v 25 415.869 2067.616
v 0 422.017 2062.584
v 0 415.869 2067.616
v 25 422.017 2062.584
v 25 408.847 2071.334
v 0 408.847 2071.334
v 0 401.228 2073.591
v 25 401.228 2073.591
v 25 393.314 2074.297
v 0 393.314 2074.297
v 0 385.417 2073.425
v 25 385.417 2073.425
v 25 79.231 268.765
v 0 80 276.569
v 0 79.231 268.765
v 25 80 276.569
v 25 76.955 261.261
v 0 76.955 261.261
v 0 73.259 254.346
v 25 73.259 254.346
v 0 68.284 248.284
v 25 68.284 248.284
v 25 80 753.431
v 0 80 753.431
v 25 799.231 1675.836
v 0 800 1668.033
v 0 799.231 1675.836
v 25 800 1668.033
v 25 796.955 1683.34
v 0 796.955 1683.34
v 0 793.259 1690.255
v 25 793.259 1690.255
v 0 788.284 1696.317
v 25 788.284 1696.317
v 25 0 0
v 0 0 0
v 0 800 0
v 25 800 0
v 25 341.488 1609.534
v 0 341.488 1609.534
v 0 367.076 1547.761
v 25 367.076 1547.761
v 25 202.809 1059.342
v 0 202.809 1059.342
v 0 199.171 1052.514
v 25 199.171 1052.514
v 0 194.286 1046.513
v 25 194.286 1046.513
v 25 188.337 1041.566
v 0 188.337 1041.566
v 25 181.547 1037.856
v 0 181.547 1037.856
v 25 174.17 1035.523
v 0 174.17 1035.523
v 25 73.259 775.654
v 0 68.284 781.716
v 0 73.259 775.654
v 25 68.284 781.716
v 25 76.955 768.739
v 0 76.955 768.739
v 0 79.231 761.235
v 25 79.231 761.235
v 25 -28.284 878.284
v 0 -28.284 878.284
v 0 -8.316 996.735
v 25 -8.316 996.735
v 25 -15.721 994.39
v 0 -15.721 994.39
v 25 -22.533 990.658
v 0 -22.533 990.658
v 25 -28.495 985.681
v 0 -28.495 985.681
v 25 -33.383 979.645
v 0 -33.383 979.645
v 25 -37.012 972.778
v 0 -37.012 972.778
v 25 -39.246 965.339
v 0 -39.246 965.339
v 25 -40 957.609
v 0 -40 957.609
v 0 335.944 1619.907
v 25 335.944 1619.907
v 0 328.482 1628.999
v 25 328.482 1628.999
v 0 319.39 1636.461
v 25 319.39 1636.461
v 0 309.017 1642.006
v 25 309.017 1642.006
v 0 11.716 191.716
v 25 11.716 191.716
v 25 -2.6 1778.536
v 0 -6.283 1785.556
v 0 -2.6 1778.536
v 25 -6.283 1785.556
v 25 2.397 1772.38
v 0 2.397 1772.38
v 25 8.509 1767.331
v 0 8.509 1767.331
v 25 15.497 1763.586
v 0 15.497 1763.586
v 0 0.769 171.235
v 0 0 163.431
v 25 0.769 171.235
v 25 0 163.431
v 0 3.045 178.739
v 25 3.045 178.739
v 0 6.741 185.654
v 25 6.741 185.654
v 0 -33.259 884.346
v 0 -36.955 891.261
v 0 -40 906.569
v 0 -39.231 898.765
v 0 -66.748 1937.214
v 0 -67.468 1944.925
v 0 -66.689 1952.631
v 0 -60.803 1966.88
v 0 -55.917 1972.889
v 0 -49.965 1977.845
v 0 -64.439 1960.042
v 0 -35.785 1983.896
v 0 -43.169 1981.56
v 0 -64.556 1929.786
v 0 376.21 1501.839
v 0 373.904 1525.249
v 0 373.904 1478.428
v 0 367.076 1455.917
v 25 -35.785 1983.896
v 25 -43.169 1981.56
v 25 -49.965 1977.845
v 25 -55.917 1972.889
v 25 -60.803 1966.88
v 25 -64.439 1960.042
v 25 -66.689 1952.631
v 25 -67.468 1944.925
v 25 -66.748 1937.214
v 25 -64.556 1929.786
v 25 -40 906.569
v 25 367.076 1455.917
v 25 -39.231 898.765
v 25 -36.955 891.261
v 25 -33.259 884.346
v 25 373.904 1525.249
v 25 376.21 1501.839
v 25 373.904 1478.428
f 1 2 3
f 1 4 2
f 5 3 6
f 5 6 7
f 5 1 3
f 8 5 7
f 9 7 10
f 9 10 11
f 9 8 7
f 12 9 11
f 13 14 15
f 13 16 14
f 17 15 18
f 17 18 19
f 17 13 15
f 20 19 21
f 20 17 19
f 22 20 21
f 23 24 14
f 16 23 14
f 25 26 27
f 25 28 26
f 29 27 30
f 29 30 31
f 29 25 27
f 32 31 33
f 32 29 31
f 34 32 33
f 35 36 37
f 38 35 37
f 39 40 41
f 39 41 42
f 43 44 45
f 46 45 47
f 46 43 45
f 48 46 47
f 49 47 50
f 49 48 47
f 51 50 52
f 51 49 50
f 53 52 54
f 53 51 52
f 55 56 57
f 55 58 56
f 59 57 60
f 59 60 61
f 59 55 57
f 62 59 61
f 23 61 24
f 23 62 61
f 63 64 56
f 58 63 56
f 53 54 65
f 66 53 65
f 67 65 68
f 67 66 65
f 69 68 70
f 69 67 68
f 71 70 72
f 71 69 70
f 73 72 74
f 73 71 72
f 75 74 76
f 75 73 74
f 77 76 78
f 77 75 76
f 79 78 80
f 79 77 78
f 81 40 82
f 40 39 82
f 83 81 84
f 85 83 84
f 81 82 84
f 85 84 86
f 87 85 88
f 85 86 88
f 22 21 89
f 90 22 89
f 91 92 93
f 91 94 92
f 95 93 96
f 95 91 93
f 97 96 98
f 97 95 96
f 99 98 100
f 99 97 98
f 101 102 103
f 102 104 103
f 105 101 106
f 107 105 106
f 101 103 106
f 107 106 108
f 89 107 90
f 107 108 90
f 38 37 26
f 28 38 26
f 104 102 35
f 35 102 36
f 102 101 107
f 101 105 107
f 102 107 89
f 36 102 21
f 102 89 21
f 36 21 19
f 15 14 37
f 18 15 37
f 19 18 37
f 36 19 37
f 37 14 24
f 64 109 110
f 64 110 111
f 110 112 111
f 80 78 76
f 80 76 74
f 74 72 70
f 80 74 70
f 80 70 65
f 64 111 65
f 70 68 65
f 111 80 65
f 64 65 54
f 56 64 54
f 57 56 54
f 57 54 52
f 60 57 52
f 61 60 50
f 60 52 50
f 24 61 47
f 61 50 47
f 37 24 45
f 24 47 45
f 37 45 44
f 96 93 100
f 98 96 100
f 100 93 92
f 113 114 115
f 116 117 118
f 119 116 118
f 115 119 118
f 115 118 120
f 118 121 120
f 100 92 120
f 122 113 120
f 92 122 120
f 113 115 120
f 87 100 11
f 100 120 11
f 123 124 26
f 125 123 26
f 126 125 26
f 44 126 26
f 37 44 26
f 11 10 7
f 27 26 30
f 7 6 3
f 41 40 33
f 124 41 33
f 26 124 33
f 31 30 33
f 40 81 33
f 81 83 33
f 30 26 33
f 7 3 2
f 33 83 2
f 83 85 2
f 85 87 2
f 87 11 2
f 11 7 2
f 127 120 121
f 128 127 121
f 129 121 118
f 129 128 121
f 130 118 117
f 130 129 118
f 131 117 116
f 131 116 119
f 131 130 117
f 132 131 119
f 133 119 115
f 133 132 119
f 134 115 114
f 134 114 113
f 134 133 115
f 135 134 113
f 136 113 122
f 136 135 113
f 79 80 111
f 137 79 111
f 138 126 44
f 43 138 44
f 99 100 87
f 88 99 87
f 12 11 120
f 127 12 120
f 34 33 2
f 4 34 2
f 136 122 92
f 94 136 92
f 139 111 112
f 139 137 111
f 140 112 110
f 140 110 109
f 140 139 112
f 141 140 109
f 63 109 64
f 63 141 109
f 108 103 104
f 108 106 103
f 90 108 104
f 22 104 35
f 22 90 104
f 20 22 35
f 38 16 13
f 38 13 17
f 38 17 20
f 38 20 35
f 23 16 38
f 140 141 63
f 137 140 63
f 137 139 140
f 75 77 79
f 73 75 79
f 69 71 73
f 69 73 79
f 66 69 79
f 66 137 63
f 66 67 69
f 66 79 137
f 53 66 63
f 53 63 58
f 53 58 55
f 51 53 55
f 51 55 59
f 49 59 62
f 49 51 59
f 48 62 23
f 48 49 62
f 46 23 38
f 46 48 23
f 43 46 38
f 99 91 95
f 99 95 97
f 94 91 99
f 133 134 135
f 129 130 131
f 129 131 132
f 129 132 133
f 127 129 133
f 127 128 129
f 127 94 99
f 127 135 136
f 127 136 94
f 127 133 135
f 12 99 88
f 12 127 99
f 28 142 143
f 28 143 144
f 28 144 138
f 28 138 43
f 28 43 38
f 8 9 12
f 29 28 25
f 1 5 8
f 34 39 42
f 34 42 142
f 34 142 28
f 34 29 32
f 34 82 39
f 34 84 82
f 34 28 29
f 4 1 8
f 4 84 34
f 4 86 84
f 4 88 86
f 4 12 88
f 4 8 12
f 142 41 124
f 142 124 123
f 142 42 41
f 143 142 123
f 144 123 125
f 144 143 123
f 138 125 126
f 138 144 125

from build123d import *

# Parameters (mm, degrees)
F1_DEPTH = 25
F2_R     = 40
F3_SIZE  = 100
F4_R     = 120
F5_R     = 60


with BuildPart() as f1:
    # F0 (on Right) → F1 (new body)
    with BuildSketch(Plane.YZ):
        Polygon((0, 180), (0, 0), (800, 0), (800, 1684.6011072401), (406.6603498154, 2077.9407574247), (-82.4134505515, 1973.9849120159), (0, 1770.0044640112), (424.3654835952, 1594.226525303), (194.7554241761, 1039.8988057963), (-40, 990), (-40, 890), (80, 770), (80, 260), align=None)
    extrude(amount=F1_DEPTH)

    # F2
    f2_edges = [f1.edges().sort_by_distance(p)[0] for p in [
        (12.5, 194.755424, 1039.898806),
        (12.5, 0, 1770.004464),
        (12.5, -82.413451, 1973.984912),
        (12.5, 406.66035, 2077.940757),
        (12.5, 800, 1684.601107),
        (12.5, -40, 990),
        (12.5, -40, 890),
        (12.5, 80, 770),
        (12.5, 80, 260),
        (12.5, 0, 180),
    ]]
    fillet(f2_edges, radius=F2_R)

    # F3
    f3_edges = [f1.edges().sort_by_distance(p)[0] for p in [
        (12.5, 424.365484, 1594.226525),
    ]]
    chamfer(f3_edges, length=F3_SIZE)

    # F4
    f4_edges = [f1.edges().sort_by_distance(p)[0] for p in [
        (12.5, 386.09714, 1501.838572),
    ]]
    fillet(f4_edges, radius=F4_R)

    # F5
    f5_edges = [f1.edges().sort_by_distance(p)[0] for p in [
        (12.5, 331.97753, 1632.494869),
    ]]
    fillet(f5_edges, radius=F5_R)


solid = f1.part
